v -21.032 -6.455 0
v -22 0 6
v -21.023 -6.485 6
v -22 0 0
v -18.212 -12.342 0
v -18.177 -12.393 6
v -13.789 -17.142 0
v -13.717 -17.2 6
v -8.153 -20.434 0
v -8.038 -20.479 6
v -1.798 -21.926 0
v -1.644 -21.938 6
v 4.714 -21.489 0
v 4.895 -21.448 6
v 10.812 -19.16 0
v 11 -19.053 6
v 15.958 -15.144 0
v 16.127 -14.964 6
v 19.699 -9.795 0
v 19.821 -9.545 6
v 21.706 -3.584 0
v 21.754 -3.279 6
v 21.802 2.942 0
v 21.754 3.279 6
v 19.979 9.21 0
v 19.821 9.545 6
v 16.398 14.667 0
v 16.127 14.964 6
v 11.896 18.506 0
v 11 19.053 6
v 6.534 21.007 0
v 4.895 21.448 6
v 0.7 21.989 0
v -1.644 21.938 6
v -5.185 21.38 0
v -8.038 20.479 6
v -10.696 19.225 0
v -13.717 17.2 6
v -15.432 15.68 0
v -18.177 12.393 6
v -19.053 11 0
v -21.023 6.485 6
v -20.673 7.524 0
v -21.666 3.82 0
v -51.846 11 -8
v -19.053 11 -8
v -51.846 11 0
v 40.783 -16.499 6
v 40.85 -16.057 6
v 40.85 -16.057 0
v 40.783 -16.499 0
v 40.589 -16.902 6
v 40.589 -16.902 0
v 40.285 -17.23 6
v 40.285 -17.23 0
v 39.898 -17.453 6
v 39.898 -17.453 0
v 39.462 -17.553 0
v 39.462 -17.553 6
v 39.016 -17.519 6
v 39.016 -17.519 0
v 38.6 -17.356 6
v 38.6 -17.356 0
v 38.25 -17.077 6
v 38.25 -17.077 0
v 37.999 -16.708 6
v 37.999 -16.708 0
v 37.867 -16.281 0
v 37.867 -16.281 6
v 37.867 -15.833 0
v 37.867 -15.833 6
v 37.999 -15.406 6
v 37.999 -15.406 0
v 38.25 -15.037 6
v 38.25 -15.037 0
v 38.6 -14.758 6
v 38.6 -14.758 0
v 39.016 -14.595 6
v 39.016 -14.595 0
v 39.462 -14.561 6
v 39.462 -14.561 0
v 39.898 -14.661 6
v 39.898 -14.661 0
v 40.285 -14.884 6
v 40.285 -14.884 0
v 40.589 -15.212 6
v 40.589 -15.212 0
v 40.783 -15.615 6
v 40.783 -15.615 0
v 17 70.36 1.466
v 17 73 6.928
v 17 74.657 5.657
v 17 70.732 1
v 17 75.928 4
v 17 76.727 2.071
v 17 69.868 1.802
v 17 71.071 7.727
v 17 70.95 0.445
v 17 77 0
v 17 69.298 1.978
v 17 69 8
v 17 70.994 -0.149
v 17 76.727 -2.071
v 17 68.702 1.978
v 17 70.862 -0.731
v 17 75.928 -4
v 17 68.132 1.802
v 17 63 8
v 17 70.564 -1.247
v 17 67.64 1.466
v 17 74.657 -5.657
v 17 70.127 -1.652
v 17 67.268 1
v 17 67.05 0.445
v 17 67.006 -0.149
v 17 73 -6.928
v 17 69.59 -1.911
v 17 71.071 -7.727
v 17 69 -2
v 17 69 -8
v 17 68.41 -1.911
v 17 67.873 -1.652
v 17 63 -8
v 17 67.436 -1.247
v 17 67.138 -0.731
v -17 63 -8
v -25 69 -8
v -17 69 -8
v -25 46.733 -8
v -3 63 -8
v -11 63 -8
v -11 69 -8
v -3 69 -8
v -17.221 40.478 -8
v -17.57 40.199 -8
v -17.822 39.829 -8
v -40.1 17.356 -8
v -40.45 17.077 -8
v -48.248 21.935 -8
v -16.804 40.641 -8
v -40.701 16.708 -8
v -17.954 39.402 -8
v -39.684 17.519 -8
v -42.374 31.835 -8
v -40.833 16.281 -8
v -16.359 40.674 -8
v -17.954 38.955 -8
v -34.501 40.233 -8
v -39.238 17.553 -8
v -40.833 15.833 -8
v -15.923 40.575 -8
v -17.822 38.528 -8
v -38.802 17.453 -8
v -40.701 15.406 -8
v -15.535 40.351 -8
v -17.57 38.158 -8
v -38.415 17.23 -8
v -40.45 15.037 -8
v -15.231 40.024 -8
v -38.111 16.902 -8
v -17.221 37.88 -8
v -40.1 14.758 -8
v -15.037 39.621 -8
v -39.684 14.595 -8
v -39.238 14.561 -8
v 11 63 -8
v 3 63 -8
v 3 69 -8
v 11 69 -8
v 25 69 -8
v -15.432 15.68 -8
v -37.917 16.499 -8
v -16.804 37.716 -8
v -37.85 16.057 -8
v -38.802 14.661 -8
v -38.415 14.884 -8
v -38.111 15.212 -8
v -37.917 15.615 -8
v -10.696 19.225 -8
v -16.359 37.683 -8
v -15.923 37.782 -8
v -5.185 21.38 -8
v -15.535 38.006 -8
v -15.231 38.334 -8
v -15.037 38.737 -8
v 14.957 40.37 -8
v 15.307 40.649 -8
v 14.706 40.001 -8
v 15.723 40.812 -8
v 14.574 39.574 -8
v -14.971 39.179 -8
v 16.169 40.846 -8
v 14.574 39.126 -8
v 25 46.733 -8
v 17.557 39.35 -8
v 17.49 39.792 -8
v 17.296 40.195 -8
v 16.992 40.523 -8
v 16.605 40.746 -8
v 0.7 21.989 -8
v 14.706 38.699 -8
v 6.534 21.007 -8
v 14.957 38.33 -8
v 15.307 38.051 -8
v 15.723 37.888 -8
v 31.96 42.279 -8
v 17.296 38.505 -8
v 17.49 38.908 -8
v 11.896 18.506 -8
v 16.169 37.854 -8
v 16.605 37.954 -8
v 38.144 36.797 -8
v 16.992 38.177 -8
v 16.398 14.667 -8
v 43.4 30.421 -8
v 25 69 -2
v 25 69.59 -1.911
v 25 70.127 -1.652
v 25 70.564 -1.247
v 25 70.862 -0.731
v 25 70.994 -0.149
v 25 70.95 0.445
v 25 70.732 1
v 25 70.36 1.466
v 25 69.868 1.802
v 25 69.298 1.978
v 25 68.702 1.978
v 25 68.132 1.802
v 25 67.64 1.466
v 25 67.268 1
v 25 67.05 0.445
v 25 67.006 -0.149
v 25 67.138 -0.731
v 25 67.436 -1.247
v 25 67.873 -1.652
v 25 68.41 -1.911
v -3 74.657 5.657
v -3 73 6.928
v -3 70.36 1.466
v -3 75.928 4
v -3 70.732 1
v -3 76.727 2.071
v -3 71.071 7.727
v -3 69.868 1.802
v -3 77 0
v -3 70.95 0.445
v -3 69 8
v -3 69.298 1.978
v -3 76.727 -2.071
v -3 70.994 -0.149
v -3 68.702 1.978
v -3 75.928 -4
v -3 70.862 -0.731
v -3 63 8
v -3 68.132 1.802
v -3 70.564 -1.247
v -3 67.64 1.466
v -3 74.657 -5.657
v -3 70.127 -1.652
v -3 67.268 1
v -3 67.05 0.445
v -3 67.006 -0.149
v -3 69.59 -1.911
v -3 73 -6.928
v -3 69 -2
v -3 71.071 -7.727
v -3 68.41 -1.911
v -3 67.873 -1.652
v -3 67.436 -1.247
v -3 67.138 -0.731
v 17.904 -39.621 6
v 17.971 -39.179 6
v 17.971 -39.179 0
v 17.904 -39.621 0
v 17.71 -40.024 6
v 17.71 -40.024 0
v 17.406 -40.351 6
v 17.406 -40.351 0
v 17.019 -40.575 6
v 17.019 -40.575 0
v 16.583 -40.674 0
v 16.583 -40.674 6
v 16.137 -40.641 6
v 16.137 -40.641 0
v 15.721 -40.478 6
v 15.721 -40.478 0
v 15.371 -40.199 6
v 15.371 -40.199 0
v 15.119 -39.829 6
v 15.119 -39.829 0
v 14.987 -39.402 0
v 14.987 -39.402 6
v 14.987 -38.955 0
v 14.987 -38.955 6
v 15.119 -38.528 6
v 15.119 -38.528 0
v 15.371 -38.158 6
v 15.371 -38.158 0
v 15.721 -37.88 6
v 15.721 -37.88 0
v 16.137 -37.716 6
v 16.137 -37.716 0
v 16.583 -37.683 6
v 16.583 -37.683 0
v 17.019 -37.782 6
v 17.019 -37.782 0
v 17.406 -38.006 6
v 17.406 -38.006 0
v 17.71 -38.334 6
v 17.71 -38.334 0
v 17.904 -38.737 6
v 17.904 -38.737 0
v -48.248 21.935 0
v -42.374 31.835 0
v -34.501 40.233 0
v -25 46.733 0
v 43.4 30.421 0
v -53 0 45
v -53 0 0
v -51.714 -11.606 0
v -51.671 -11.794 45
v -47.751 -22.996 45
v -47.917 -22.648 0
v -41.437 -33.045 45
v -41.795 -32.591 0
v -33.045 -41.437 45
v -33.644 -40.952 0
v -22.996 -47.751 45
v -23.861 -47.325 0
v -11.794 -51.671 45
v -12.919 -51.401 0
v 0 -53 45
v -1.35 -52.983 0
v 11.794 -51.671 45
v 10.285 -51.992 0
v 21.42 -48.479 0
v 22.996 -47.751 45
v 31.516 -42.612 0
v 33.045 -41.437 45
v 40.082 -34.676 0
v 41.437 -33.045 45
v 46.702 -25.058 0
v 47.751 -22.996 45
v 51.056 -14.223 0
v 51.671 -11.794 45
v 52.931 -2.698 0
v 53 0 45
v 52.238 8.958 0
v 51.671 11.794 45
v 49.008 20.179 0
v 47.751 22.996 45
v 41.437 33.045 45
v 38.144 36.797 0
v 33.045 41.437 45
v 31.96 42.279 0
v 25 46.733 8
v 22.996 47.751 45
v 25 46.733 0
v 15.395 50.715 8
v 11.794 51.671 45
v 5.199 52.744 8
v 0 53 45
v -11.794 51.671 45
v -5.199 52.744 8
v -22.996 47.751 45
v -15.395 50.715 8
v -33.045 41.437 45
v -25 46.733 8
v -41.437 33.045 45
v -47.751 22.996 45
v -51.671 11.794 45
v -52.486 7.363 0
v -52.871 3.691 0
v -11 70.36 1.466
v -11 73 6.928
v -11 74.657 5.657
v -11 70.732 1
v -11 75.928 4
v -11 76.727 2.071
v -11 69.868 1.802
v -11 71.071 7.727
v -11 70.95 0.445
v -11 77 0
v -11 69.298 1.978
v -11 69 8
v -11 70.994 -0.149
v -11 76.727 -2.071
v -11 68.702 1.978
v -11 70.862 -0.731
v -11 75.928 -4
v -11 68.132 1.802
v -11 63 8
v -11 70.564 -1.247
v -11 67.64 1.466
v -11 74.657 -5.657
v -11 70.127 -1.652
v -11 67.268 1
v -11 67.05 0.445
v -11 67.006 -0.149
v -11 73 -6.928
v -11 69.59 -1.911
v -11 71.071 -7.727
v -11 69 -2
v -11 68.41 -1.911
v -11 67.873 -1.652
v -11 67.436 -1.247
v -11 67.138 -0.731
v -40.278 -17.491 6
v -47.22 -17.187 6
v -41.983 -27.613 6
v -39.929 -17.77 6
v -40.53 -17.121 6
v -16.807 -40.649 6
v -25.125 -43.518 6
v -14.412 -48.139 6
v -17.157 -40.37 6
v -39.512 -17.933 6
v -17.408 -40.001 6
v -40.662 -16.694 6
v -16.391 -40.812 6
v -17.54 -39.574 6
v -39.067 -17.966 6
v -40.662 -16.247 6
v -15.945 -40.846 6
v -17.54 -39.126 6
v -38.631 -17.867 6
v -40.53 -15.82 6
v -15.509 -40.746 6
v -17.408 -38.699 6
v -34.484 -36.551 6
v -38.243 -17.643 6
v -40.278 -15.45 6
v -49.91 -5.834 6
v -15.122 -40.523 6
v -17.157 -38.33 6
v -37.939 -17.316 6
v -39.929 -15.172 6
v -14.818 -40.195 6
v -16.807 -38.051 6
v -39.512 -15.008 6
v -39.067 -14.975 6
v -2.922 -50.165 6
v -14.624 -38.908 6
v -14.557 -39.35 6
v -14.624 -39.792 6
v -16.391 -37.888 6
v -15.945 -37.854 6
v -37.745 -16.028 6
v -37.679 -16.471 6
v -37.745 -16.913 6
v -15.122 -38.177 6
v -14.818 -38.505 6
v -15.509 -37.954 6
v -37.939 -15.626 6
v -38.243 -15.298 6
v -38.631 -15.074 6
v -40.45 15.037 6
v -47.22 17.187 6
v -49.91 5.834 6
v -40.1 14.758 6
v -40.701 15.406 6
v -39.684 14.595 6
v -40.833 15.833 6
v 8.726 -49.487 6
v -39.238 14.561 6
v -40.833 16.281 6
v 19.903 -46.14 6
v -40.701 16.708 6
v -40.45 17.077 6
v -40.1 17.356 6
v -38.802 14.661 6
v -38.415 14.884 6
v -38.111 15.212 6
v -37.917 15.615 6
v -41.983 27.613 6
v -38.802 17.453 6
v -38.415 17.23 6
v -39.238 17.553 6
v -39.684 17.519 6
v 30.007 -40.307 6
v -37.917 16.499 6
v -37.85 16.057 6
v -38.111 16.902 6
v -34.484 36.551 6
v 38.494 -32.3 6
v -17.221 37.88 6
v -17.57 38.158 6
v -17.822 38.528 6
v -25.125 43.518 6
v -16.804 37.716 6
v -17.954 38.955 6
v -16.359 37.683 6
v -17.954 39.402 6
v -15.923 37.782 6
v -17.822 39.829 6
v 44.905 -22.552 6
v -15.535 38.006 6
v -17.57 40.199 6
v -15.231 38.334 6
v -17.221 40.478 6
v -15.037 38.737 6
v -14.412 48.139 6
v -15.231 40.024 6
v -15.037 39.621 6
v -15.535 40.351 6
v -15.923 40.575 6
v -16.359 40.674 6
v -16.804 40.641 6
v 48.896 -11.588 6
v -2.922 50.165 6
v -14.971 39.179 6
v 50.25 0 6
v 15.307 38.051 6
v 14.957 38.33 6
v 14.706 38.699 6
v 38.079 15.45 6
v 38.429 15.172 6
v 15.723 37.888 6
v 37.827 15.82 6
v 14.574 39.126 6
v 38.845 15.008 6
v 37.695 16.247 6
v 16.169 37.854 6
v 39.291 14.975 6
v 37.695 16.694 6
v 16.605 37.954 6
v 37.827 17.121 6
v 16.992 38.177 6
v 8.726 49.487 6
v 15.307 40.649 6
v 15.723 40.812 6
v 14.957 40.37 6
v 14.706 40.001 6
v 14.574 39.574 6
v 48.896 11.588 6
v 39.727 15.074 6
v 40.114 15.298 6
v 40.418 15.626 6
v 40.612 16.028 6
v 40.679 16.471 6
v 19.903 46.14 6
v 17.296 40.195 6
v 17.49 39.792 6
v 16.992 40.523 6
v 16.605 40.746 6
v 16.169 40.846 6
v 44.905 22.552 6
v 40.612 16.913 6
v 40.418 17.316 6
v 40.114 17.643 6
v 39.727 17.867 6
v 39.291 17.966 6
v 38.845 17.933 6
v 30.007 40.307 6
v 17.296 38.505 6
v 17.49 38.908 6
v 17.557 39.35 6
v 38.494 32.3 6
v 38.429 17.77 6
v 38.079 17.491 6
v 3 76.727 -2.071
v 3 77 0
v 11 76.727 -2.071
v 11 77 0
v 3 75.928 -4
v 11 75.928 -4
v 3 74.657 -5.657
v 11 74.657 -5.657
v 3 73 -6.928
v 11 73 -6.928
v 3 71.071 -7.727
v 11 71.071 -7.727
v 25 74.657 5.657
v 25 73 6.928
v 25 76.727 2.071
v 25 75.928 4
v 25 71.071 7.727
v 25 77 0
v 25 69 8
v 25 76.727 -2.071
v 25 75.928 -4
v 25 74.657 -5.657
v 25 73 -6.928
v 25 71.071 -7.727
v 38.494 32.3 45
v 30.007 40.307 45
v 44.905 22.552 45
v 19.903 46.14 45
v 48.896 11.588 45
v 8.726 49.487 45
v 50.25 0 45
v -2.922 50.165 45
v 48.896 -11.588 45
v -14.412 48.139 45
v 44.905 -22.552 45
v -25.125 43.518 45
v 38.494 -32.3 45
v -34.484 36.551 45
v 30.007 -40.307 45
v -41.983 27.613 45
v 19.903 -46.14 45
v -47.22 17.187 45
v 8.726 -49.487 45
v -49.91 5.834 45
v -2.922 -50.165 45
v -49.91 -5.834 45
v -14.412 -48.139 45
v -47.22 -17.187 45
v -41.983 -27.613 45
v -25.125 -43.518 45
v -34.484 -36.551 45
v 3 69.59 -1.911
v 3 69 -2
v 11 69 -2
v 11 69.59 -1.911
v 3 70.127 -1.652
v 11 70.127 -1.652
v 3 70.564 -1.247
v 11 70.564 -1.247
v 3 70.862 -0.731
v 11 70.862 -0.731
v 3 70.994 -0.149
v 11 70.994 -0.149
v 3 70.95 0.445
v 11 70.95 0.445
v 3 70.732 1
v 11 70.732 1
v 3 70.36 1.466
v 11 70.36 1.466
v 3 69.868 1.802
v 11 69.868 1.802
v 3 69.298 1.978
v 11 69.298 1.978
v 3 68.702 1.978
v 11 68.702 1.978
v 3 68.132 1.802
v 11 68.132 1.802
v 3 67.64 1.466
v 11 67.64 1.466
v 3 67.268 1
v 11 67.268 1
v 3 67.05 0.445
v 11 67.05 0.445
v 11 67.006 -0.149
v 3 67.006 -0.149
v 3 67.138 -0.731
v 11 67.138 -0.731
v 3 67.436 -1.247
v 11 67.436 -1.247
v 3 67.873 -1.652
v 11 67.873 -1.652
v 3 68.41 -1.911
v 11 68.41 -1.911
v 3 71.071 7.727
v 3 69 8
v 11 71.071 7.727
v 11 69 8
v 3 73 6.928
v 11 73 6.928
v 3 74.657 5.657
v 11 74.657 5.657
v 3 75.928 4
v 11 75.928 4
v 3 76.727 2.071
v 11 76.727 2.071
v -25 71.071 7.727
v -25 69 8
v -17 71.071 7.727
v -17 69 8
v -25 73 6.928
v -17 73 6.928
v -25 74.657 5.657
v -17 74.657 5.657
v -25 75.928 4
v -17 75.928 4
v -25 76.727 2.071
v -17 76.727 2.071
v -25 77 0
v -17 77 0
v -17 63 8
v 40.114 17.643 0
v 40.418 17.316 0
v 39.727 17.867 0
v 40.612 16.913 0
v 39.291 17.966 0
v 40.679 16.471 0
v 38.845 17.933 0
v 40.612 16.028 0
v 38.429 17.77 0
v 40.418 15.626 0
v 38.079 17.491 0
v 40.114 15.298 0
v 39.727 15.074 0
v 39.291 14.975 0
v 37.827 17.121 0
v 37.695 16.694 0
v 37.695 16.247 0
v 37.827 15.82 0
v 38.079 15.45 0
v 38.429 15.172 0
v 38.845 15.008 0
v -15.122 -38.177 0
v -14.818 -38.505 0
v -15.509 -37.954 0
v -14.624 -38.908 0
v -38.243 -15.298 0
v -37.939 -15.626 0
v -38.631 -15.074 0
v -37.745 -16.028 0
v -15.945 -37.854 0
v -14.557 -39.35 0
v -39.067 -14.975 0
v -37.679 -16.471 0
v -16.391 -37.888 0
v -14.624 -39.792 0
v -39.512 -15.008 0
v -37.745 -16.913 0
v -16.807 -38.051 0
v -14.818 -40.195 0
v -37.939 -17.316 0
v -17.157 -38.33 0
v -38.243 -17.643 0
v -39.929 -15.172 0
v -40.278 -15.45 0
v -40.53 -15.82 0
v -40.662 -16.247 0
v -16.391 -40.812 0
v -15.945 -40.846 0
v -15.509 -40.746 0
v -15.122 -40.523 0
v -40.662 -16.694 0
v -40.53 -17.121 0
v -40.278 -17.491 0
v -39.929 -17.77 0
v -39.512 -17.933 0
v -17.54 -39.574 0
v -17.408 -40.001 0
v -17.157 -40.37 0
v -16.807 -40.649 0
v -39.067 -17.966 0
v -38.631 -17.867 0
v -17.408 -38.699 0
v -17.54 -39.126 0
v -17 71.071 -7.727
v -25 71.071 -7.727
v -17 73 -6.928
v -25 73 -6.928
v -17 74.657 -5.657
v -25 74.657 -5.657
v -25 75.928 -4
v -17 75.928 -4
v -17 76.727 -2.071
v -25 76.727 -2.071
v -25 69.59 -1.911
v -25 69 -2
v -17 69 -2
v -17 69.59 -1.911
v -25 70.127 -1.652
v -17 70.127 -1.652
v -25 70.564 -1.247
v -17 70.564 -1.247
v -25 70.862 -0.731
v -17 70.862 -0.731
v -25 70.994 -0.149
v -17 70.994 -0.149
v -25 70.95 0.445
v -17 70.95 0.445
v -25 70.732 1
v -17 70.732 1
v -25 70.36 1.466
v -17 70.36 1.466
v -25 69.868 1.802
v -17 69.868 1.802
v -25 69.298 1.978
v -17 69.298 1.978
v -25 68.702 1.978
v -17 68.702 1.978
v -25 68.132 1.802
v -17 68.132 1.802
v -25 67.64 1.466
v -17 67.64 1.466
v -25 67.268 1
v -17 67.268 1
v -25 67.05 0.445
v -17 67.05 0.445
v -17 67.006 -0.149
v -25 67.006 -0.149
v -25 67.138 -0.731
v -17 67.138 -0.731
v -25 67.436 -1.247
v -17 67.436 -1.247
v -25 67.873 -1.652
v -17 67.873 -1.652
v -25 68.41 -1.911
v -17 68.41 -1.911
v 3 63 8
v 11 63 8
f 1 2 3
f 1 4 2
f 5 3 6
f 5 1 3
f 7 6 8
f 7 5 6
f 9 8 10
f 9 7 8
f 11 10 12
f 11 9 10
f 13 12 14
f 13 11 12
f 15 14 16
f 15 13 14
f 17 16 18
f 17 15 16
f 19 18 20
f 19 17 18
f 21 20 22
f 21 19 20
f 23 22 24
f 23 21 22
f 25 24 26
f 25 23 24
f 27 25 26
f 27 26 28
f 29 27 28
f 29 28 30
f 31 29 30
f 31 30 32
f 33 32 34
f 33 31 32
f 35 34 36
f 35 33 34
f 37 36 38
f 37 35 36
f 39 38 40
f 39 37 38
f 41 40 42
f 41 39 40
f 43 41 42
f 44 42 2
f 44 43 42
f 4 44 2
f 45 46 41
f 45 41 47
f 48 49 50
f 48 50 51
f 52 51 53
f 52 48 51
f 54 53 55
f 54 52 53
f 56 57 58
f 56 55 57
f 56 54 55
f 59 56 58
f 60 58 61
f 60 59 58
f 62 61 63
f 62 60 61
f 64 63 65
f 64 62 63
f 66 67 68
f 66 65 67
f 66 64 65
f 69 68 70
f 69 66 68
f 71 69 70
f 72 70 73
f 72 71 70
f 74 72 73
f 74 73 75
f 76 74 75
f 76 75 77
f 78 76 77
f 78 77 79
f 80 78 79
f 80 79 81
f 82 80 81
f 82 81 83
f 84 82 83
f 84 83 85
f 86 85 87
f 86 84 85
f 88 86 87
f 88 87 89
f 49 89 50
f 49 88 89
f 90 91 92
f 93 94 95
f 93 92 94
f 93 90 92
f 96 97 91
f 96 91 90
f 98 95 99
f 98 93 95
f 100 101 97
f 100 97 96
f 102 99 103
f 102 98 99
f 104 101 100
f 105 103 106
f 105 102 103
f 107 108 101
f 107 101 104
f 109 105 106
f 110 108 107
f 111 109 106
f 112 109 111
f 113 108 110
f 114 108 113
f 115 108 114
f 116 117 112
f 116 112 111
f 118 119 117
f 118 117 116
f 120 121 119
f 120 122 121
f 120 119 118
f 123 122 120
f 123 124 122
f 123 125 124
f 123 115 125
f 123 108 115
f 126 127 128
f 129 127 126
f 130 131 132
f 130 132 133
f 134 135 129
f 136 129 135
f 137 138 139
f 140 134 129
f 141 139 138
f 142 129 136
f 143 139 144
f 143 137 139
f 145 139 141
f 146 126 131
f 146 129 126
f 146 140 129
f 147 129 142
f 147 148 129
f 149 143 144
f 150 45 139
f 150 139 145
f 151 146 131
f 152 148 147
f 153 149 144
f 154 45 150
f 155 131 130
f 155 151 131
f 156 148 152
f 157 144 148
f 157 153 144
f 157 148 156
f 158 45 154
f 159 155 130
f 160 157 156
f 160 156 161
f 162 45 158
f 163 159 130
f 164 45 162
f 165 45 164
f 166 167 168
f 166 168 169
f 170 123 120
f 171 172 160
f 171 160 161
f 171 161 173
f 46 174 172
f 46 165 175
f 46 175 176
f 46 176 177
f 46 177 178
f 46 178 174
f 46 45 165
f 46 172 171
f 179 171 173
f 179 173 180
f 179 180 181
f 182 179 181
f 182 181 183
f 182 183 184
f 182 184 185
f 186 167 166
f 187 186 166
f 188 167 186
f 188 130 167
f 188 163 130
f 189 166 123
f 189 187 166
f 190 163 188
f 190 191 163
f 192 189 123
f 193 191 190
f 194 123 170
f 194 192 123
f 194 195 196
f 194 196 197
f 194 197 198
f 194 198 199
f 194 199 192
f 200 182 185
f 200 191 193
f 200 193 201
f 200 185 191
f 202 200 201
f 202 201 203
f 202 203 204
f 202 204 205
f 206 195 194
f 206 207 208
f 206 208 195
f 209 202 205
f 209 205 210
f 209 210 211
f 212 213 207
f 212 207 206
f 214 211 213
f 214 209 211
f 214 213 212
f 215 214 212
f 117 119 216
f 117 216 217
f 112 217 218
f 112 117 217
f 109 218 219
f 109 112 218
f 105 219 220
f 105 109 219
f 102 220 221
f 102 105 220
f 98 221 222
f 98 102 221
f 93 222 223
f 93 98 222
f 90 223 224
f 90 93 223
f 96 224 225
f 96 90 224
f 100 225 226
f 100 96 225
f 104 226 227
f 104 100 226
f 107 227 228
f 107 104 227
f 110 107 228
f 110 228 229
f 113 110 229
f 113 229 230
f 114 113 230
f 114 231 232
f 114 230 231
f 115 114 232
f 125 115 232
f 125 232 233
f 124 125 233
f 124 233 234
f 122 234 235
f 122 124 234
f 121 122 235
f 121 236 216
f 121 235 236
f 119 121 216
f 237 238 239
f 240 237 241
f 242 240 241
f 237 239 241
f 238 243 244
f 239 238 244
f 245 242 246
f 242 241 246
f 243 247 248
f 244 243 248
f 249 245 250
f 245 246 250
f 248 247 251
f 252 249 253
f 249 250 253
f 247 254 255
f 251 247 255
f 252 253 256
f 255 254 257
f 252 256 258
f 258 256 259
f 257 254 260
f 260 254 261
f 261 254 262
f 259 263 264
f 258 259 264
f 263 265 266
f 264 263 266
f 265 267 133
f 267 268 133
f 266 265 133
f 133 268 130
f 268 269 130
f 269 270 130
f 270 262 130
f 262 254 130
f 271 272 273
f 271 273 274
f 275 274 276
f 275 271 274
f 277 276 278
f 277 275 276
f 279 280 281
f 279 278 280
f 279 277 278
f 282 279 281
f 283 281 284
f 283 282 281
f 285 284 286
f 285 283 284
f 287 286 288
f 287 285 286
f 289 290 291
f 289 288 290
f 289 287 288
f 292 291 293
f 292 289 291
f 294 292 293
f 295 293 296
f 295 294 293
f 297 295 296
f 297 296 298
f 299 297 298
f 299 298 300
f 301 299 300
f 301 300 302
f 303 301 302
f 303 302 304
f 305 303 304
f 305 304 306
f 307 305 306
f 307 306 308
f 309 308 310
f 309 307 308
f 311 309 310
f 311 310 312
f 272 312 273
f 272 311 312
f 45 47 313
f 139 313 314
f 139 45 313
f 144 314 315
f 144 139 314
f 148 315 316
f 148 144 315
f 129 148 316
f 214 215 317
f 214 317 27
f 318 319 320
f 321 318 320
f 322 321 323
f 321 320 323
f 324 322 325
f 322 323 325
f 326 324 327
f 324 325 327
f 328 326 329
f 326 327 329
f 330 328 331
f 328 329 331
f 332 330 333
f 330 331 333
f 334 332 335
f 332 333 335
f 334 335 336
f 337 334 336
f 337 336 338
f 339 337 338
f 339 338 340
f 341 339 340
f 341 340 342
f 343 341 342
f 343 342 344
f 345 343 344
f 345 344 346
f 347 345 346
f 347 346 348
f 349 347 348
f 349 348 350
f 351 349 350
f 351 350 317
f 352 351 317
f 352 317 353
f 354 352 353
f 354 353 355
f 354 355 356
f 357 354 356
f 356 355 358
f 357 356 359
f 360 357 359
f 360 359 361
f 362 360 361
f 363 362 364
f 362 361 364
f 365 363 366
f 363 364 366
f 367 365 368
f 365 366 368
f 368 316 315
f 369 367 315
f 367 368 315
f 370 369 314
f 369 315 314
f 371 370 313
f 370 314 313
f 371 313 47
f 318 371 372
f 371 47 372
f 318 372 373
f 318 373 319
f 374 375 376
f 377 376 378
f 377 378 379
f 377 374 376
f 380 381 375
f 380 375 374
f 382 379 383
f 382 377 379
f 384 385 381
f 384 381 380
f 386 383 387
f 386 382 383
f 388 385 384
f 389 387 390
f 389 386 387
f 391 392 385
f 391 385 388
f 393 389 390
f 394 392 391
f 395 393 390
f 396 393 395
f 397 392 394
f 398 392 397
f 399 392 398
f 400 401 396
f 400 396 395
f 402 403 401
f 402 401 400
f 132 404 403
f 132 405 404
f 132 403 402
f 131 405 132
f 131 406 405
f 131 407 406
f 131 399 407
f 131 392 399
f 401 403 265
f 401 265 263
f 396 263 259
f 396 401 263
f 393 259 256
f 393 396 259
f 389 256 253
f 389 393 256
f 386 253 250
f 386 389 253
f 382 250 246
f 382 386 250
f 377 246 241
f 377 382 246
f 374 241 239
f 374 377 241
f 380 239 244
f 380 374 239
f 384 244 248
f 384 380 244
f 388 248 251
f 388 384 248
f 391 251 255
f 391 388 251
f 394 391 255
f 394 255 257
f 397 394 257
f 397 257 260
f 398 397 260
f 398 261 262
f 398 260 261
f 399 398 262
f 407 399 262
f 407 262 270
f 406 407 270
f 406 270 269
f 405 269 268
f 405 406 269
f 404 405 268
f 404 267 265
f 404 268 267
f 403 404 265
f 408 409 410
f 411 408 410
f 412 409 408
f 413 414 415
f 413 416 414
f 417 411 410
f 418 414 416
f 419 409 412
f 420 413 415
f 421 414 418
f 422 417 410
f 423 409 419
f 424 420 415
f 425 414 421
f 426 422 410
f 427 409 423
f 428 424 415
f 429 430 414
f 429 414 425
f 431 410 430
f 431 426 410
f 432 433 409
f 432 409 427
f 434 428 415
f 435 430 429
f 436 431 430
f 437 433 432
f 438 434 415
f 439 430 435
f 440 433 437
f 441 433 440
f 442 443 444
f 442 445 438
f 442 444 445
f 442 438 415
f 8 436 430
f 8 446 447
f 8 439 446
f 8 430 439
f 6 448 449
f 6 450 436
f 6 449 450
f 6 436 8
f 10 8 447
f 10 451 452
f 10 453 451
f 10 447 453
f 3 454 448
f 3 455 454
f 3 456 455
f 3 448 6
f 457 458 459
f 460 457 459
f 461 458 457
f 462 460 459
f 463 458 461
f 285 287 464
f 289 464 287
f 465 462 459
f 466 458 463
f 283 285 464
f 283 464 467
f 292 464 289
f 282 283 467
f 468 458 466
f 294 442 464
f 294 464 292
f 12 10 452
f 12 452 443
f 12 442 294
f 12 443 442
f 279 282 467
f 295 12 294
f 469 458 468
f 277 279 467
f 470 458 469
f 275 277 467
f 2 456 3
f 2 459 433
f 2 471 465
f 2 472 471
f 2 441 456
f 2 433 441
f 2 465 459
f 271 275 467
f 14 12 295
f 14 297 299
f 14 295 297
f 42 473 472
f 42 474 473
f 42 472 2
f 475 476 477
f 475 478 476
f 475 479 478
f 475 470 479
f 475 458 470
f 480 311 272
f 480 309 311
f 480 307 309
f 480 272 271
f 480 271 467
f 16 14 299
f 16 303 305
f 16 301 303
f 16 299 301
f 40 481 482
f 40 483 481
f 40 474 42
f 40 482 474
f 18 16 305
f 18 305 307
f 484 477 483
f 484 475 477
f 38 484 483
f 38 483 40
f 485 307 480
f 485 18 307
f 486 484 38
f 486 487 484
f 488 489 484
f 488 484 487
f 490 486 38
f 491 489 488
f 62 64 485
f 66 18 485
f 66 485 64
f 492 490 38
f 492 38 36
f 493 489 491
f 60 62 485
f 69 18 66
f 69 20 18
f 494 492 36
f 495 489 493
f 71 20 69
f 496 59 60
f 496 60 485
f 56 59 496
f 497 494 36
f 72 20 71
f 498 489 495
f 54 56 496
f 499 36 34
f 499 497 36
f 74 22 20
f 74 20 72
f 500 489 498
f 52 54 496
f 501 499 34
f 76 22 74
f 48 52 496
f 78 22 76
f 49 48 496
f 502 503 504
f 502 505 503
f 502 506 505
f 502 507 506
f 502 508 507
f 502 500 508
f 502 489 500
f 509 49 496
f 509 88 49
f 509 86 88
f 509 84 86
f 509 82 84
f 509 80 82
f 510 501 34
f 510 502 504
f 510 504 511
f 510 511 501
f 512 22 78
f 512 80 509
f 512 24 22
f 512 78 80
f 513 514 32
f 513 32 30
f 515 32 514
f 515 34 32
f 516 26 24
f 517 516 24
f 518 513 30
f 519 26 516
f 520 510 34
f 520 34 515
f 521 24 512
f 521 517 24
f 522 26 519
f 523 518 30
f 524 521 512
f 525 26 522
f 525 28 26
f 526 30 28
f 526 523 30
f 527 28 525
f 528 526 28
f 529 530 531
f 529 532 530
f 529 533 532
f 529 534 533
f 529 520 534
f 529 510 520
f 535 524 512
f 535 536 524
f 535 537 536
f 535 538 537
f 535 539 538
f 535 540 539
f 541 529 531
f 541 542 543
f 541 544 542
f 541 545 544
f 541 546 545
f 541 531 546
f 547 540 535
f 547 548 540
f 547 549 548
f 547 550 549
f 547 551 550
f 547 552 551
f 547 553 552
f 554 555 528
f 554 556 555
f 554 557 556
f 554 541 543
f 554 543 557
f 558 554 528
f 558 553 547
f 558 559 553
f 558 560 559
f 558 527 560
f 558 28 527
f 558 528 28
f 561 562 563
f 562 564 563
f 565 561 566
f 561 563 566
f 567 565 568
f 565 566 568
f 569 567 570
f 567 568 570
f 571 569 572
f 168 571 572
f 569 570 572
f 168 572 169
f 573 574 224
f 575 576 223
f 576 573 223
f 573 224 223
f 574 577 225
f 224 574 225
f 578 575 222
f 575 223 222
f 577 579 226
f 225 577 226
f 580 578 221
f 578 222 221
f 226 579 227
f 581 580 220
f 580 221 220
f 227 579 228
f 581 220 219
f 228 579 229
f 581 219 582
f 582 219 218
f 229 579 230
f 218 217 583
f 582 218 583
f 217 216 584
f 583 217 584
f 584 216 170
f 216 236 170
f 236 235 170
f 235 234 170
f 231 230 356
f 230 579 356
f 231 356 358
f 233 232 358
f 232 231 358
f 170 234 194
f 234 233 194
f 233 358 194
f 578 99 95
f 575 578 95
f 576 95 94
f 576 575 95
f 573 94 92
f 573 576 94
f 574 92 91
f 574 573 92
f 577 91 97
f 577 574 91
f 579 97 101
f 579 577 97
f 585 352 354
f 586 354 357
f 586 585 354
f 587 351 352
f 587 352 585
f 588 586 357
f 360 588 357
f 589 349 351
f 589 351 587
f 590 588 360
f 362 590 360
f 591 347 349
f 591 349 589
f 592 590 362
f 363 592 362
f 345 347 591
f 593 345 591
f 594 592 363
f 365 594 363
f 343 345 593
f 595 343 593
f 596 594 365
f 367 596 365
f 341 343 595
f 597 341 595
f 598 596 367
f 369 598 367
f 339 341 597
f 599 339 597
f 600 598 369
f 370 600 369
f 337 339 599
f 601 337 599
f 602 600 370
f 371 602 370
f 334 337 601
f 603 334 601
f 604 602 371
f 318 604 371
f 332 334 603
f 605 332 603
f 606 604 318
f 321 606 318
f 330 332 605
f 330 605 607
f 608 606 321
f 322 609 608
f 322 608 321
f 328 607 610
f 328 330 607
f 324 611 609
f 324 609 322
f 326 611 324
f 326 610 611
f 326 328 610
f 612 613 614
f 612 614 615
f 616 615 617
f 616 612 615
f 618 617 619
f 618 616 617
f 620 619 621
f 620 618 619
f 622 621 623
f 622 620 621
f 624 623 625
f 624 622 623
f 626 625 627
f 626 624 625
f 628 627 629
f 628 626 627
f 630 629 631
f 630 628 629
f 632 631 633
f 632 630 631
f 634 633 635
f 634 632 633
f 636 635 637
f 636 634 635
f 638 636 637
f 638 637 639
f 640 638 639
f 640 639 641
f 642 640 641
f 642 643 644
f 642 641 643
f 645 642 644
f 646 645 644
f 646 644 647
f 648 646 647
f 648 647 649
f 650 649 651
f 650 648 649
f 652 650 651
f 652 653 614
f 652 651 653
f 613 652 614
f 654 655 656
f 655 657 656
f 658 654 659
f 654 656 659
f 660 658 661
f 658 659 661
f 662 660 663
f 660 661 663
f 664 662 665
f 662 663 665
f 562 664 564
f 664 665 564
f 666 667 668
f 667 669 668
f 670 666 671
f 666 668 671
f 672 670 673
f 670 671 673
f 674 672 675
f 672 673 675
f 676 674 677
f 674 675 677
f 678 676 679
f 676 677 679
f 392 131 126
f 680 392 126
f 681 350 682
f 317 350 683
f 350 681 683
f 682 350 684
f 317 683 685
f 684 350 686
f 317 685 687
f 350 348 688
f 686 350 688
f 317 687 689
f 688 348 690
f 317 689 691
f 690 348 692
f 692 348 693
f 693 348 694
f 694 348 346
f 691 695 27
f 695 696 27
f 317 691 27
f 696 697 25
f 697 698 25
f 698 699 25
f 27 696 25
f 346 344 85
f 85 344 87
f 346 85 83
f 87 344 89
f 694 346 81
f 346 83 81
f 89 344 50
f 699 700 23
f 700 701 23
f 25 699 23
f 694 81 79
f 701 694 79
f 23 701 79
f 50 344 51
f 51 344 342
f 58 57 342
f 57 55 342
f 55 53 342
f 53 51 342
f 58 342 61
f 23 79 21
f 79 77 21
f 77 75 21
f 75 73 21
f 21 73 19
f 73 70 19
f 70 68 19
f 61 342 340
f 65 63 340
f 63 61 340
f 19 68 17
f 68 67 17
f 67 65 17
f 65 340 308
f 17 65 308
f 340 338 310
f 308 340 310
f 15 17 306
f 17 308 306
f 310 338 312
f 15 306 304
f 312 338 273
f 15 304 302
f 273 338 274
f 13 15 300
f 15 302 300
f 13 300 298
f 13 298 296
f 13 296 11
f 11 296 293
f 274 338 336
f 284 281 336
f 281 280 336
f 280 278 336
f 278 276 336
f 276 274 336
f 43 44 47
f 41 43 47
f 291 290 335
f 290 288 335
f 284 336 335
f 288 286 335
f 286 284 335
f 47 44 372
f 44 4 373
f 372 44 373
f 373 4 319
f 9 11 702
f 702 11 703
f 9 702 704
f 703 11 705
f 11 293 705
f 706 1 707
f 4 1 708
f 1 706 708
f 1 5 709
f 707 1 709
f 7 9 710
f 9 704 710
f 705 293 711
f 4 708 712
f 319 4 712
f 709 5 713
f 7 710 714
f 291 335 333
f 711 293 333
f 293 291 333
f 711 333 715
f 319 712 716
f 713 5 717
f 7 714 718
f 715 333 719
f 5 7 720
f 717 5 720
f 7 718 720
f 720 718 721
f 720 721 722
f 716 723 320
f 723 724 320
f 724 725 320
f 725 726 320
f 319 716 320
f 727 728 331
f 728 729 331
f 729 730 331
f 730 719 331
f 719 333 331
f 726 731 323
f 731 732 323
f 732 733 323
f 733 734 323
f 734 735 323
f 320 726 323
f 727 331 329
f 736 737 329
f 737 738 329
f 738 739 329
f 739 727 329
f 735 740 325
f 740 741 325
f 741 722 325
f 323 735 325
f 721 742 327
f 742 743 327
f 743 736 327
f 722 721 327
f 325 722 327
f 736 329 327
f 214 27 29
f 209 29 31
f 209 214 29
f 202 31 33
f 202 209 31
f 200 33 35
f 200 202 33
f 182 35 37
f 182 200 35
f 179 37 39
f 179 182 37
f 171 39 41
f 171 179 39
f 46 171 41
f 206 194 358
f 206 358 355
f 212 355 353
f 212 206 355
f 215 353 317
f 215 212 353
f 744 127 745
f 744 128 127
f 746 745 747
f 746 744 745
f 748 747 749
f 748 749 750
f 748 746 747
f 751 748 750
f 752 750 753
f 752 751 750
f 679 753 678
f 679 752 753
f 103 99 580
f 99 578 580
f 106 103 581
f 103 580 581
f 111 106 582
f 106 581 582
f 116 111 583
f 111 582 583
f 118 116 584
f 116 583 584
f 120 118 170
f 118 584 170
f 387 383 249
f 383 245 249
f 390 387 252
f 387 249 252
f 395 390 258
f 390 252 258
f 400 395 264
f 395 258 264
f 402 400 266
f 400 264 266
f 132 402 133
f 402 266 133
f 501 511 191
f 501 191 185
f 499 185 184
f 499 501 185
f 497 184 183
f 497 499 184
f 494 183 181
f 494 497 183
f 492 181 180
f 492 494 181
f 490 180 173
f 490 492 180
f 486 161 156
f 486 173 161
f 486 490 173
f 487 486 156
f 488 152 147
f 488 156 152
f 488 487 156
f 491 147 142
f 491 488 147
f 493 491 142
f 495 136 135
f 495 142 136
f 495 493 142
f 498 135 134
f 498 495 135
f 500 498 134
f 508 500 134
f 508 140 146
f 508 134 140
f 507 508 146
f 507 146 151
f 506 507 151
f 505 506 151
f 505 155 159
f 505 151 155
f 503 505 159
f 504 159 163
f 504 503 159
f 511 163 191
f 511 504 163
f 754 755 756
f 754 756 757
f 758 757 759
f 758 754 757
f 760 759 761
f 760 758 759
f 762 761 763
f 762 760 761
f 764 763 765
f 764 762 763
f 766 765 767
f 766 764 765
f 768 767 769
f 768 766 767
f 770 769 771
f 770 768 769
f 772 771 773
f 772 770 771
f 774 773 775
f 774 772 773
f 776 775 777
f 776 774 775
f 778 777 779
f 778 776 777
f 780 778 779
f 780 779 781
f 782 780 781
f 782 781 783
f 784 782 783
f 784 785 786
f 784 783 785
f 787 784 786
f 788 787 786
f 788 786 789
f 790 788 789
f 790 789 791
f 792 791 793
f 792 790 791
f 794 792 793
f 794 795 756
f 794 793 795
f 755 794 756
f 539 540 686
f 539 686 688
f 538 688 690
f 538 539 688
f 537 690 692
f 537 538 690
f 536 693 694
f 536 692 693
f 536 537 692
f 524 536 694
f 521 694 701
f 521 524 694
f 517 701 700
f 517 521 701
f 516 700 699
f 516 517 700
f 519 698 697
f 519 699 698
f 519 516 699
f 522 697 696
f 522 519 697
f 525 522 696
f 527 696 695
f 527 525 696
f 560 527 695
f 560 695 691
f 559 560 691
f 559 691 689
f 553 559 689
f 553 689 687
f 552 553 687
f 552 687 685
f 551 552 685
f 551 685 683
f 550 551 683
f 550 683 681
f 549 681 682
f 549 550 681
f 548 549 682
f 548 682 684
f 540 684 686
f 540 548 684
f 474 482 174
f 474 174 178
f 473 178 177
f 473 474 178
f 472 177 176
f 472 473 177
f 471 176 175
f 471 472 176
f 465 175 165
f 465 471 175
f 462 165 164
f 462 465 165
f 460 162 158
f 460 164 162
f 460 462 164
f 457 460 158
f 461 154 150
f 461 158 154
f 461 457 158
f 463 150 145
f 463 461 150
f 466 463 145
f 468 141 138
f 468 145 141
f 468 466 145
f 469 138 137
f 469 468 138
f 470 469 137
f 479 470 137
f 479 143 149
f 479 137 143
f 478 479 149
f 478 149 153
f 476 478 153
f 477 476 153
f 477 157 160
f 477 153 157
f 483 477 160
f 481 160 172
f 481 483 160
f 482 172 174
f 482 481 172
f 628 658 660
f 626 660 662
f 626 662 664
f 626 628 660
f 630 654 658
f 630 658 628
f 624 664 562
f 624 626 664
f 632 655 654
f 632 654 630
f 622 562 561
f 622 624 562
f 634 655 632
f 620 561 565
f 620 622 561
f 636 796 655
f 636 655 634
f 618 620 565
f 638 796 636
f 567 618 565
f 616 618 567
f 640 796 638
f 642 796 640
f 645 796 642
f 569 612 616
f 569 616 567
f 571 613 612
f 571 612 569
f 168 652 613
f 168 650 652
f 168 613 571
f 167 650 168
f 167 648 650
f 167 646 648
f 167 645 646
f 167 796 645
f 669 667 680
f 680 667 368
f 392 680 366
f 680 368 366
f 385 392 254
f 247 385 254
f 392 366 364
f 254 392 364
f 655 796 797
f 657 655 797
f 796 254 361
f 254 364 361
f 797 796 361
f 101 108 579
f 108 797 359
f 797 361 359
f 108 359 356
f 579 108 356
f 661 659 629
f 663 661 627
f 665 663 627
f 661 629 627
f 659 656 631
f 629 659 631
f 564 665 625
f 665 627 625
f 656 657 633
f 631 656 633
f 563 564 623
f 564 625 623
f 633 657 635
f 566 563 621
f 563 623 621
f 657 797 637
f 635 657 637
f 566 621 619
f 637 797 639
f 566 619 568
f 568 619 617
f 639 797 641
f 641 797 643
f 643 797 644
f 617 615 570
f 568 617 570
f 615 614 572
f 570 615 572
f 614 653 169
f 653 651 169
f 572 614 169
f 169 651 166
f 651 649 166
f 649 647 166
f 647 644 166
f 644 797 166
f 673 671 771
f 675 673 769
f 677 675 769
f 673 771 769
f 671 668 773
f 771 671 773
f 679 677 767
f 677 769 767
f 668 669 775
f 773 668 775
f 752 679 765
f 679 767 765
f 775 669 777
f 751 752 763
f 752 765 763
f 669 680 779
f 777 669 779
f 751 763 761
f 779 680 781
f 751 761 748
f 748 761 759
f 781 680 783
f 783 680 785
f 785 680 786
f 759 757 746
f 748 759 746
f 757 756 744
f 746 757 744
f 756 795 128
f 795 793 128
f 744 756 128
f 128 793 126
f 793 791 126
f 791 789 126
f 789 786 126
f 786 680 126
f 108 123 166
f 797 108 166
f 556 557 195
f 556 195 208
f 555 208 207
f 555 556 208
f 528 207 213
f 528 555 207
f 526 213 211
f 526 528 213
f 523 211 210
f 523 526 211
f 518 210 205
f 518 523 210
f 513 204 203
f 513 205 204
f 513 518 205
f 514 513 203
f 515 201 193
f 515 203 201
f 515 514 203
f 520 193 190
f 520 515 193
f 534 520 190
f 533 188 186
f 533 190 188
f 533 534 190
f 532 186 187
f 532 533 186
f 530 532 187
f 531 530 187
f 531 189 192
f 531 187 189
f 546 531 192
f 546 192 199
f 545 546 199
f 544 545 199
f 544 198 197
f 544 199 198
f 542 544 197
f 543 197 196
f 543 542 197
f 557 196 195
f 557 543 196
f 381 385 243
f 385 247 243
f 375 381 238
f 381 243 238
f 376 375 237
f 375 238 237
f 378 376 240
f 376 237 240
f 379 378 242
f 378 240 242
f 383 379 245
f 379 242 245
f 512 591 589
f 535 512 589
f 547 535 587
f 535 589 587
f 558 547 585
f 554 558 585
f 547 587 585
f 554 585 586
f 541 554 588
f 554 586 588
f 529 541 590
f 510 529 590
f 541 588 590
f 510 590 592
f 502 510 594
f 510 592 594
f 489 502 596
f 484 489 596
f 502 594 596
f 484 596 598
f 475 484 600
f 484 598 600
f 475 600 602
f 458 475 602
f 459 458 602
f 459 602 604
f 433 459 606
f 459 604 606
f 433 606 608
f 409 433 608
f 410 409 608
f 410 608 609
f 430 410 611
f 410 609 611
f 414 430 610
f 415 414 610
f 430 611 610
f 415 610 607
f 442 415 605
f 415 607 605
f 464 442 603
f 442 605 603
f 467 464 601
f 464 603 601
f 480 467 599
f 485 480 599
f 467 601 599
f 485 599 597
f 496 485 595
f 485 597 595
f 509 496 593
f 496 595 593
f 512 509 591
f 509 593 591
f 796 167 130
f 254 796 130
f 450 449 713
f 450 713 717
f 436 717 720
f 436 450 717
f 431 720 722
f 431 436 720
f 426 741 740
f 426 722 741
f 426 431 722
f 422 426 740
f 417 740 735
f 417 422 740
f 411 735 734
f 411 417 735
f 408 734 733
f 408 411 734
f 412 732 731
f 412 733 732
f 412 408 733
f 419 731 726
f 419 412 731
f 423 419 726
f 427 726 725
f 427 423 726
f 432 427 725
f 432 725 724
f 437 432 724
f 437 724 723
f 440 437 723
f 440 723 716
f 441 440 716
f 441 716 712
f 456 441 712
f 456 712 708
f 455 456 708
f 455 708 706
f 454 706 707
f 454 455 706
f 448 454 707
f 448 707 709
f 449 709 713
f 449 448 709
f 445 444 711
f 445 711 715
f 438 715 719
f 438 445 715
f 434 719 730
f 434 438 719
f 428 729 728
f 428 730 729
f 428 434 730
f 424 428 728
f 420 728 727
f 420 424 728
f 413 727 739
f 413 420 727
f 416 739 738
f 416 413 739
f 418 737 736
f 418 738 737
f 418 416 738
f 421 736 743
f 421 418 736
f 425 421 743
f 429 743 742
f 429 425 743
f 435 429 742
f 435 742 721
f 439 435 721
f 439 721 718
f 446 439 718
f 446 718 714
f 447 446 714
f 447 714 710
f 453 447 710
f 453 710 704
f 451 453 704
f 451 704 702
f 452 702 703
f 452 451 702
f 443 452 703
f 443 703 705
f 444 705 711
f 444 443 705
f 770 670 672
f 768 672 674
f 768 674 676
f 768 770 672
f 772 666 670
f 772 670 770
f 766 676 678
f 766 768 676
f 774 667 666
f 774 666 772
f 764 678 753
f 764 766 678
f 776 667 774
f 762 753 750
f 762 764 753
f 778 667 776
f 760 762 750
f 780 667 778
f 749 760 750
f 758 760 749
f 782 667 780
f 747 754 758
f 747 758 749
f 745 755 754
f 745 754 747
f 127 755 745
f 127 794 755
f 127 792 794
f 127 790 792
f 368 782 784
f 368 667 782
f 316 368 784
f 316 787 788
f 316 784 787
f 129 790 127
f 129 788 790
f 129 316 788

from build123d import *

# Parameters (mm, degrees)
SKETCH1_R               = 53
BOSS_EXTRUDE2_DEPTH     = 45
SKETCH2_R               = 50.25
CUT_EXTRUDE1_DEPTH      = 39
SKETCH4_R               = 22
CUT_EXTRUDE3_DEPTH      = 39
BOSS_EXTRUDE3_START     = 8
BOSS_EXTRUDE3_DEPTH     = 8
CUT_EXTRUDE5_DEPTH      = 10
CUT_EXTRUDE5_DEPTH_BACK = 10
SKETCH10_R              = 1.5
BOSS_EXTRUDE6_START     = -8
BOSS_EXTRUDE6_DEPTH     = 16
SKETCH13_W              = 8
SKETCH13_H              = 16
BOSS_EXTRUDE7_DEPTH     = 14
FILLET1_R               = 8
LPATTERN1_COUNT         = 4
LPATTERN1_PITCH         = 14
FILLET1_OF_LPATTERN1_R  = 8
CUT_EXTRUDE6_DEPTH      = 119.482066153
CUT_EXTRUDE6_DEPTH_BACK = 119.482066153
SKETCH14_R              = 2


# Read off the part's stored shape, not the designer's step: Boss-Extrude6
with BuildPart() as part:
    # Sketch1 → Boss-Extrude2 (new body)
    with BuildSketch(Plane.XY):
        with Locations(Location((0, 0, 0), (0, 0, 180))):
            Circle(SKETCH1_R)
    extrude(amount=BOSS_EXTRUDE2_DEPTH)

    # Sketch2 → Cut-Extrude1 (cut)
    with BuildSketch(Plane.XY.offset(45)):
        Circle(SKETCH2_R)
    extrude(amount=-CUT_EXTRUDE1_DEPTH, mode=Mode.SUBTRACT)

    # Sketch4 → Cut-Extrude3 (cut)
    with BuildSketch(Plane(origin=(0, 0, 0), x_dir=(-1, 0, 0), z_dir=(0, 0, -1))):
        Circle(SKETCH4_R)
    extrude(amount=-CUT_EXTRUDE3_DEPTH, mode=Mode.SUBTRACT)

    # Sketch5 → Boss-Extrude3 (add)
    with BuildSketch(Plane(origin=(0, 0, 0), x_dir=(-1, 0, 0), z_dir=(0, 0, -1)).offset(BOSS_EXTRUDE3_START)):
        with BuildLine():
            Line((19.052558883, 11), (51.845925587, 11))
            ThreePointArc((51.845925587, 11), (10.588828865, 51.931461594), (-43.400241675, 30.42070056))
            Line((-43.400241675, 30.42070056), (-16.397830673, 14.666667965))
            ThreePointArc((-16.397830673, 14.666667965), (2.263406494, 21.883258236), (19.052558883, 11))
        make_face()
    extrude(amount=-BOSS_EXTRUDE3_DEPTH)

    # Sketch10 → Cut-Extrude5 (cut, two sides: drawn at the far end of the back side and taken through both)
    with BuildSketch(Plane(origin=(0, 0, 0), x_dir=(-1, 0, 0), z_dir=(0, 0, -1)).offset(-CUT_EXTRUDE5_DEPTH_BACK)):
        with Locations(Location((-39.35, -16.057007816, 0), (0, 0, 180))):
            Circle(SKETCH10_R)
        with Locations(Location((-39.178670952, 16.470632727, 0), (0, 0, 180))):
            Circle(SKETCH10_R)
        with Locations(Location((-16.057007816, 39.35, 0), (0, 0, 180))):
            Circle(SKETCH10_R)
        with Locations(Location((16.470632727, 39.178670952, 0), (0, 0, 180))):
            Circle(SKETCH10_R)
        with Locations(Location((39.35, 16.057007816, 0), (0, 0, 180))):
            Circle(SKETCH10_R)
        with Locations(Location((39.178670952, -16.470632727, 0), (0, 0, 180))):
            Circle(SKETCH10_R)
        with Locations(Location((16.057007816, -39.35, 0), (0, 0, 180))):
            Circle(SKETCH10_R)
        with Locations(Location((-16.470632728, -39.178670952, 0), (0, 0, 180))):
            Circle(SKETCH10_R)
    extrude(amount=CUT_EXTRUDE5_DEPTH + CUT_EXTRUDE5_DEPTH_BACK, mode=Mode.SUBTRACT)

    # Boss-Extrude6 outline → Boss-Extrude6 (add)
    with BuildSketch(Plane.XY.offset(BOSS_EXTRUDE6_START)):
        with BuildLine():
            Line((-25, 63), (-25, 46.733285782))
            ThreePointArc((-25, 46.733285782), (0, 53), (25, 46.733285782))
            Line((25, 46.733285782), (25, 63))
            Line((25, 63), (-25, 63))
        make_face()
    extrude(amount=BOSS_EXTRUDE6_DEPTH)

    # Sketch13 → Boss-Extrude7 (add)
    with BuildSketch(Plane(origin=(0, 63, 0), x_dir=(1, 0, 0), z_dir=(0, 1, 0))):
        with Locations((21, 0)):
            Rectangle(SKETCH13_W, SKETCH13_H)
    boss_extrude7 = extrude(amount=BOSS_EXTRUDE7_DEPTH)

    # Fillet1
    fillet1_edges = [part.edges().sort_by_distance(p)[0] for p in [
        (21, 77, 8),
        (21, 77, -8),
    ]]
    fillet(fillet1_edges, radius=FILLET1_R - 0.0001)  # a hair under: the kernel refuses the full size

    # LPattern1: Boss-Extrude7 ×4
    with Locations(*[(-i * LPATTERN1_PITCH, 0, 0) for i in range(1, LPATTERN1_COUNT)]):
        add(boss_extrude7)

    # Fillet1 of LPattern1
    fillet1_of_lpattern1_edges = [part.edges().sort_by_distance(p)[0] for p in [
        (7, 77, 8),
        (7, 77, -8),
        (-7, 77, 8),
        (-7, 77, -8),
        (-21, 77, 8),
        (-21, 77, -8),
    ]]
    fillet(fillet1_of_lpattern1_edges, radius=FILLET1_OF_LPATTERN1_R - 0.0001)  # a hair under: the kernel refuses the full size

    # Sketch14 → Cut-Extrude6 (cut, two sides: drawn at the far end of the back side and taken through both)
    with BuildSketch(Plane(origin=(25, 0, 0), x_dir=(0, 0, -1), z_dir=(1, 0, 0)).offset(-CUT_EXTRUDE6_DEPTH_BACK)):
        with Locations((0, 69)):
            Circle(SKETCH14_R)
    extrude(amount=CUT_EXTRUDE6_DEPTH + CUT_EXTRUDE6_DEPTH_BACK, mode=Mode.SUBTRACT)


solid = part.part
